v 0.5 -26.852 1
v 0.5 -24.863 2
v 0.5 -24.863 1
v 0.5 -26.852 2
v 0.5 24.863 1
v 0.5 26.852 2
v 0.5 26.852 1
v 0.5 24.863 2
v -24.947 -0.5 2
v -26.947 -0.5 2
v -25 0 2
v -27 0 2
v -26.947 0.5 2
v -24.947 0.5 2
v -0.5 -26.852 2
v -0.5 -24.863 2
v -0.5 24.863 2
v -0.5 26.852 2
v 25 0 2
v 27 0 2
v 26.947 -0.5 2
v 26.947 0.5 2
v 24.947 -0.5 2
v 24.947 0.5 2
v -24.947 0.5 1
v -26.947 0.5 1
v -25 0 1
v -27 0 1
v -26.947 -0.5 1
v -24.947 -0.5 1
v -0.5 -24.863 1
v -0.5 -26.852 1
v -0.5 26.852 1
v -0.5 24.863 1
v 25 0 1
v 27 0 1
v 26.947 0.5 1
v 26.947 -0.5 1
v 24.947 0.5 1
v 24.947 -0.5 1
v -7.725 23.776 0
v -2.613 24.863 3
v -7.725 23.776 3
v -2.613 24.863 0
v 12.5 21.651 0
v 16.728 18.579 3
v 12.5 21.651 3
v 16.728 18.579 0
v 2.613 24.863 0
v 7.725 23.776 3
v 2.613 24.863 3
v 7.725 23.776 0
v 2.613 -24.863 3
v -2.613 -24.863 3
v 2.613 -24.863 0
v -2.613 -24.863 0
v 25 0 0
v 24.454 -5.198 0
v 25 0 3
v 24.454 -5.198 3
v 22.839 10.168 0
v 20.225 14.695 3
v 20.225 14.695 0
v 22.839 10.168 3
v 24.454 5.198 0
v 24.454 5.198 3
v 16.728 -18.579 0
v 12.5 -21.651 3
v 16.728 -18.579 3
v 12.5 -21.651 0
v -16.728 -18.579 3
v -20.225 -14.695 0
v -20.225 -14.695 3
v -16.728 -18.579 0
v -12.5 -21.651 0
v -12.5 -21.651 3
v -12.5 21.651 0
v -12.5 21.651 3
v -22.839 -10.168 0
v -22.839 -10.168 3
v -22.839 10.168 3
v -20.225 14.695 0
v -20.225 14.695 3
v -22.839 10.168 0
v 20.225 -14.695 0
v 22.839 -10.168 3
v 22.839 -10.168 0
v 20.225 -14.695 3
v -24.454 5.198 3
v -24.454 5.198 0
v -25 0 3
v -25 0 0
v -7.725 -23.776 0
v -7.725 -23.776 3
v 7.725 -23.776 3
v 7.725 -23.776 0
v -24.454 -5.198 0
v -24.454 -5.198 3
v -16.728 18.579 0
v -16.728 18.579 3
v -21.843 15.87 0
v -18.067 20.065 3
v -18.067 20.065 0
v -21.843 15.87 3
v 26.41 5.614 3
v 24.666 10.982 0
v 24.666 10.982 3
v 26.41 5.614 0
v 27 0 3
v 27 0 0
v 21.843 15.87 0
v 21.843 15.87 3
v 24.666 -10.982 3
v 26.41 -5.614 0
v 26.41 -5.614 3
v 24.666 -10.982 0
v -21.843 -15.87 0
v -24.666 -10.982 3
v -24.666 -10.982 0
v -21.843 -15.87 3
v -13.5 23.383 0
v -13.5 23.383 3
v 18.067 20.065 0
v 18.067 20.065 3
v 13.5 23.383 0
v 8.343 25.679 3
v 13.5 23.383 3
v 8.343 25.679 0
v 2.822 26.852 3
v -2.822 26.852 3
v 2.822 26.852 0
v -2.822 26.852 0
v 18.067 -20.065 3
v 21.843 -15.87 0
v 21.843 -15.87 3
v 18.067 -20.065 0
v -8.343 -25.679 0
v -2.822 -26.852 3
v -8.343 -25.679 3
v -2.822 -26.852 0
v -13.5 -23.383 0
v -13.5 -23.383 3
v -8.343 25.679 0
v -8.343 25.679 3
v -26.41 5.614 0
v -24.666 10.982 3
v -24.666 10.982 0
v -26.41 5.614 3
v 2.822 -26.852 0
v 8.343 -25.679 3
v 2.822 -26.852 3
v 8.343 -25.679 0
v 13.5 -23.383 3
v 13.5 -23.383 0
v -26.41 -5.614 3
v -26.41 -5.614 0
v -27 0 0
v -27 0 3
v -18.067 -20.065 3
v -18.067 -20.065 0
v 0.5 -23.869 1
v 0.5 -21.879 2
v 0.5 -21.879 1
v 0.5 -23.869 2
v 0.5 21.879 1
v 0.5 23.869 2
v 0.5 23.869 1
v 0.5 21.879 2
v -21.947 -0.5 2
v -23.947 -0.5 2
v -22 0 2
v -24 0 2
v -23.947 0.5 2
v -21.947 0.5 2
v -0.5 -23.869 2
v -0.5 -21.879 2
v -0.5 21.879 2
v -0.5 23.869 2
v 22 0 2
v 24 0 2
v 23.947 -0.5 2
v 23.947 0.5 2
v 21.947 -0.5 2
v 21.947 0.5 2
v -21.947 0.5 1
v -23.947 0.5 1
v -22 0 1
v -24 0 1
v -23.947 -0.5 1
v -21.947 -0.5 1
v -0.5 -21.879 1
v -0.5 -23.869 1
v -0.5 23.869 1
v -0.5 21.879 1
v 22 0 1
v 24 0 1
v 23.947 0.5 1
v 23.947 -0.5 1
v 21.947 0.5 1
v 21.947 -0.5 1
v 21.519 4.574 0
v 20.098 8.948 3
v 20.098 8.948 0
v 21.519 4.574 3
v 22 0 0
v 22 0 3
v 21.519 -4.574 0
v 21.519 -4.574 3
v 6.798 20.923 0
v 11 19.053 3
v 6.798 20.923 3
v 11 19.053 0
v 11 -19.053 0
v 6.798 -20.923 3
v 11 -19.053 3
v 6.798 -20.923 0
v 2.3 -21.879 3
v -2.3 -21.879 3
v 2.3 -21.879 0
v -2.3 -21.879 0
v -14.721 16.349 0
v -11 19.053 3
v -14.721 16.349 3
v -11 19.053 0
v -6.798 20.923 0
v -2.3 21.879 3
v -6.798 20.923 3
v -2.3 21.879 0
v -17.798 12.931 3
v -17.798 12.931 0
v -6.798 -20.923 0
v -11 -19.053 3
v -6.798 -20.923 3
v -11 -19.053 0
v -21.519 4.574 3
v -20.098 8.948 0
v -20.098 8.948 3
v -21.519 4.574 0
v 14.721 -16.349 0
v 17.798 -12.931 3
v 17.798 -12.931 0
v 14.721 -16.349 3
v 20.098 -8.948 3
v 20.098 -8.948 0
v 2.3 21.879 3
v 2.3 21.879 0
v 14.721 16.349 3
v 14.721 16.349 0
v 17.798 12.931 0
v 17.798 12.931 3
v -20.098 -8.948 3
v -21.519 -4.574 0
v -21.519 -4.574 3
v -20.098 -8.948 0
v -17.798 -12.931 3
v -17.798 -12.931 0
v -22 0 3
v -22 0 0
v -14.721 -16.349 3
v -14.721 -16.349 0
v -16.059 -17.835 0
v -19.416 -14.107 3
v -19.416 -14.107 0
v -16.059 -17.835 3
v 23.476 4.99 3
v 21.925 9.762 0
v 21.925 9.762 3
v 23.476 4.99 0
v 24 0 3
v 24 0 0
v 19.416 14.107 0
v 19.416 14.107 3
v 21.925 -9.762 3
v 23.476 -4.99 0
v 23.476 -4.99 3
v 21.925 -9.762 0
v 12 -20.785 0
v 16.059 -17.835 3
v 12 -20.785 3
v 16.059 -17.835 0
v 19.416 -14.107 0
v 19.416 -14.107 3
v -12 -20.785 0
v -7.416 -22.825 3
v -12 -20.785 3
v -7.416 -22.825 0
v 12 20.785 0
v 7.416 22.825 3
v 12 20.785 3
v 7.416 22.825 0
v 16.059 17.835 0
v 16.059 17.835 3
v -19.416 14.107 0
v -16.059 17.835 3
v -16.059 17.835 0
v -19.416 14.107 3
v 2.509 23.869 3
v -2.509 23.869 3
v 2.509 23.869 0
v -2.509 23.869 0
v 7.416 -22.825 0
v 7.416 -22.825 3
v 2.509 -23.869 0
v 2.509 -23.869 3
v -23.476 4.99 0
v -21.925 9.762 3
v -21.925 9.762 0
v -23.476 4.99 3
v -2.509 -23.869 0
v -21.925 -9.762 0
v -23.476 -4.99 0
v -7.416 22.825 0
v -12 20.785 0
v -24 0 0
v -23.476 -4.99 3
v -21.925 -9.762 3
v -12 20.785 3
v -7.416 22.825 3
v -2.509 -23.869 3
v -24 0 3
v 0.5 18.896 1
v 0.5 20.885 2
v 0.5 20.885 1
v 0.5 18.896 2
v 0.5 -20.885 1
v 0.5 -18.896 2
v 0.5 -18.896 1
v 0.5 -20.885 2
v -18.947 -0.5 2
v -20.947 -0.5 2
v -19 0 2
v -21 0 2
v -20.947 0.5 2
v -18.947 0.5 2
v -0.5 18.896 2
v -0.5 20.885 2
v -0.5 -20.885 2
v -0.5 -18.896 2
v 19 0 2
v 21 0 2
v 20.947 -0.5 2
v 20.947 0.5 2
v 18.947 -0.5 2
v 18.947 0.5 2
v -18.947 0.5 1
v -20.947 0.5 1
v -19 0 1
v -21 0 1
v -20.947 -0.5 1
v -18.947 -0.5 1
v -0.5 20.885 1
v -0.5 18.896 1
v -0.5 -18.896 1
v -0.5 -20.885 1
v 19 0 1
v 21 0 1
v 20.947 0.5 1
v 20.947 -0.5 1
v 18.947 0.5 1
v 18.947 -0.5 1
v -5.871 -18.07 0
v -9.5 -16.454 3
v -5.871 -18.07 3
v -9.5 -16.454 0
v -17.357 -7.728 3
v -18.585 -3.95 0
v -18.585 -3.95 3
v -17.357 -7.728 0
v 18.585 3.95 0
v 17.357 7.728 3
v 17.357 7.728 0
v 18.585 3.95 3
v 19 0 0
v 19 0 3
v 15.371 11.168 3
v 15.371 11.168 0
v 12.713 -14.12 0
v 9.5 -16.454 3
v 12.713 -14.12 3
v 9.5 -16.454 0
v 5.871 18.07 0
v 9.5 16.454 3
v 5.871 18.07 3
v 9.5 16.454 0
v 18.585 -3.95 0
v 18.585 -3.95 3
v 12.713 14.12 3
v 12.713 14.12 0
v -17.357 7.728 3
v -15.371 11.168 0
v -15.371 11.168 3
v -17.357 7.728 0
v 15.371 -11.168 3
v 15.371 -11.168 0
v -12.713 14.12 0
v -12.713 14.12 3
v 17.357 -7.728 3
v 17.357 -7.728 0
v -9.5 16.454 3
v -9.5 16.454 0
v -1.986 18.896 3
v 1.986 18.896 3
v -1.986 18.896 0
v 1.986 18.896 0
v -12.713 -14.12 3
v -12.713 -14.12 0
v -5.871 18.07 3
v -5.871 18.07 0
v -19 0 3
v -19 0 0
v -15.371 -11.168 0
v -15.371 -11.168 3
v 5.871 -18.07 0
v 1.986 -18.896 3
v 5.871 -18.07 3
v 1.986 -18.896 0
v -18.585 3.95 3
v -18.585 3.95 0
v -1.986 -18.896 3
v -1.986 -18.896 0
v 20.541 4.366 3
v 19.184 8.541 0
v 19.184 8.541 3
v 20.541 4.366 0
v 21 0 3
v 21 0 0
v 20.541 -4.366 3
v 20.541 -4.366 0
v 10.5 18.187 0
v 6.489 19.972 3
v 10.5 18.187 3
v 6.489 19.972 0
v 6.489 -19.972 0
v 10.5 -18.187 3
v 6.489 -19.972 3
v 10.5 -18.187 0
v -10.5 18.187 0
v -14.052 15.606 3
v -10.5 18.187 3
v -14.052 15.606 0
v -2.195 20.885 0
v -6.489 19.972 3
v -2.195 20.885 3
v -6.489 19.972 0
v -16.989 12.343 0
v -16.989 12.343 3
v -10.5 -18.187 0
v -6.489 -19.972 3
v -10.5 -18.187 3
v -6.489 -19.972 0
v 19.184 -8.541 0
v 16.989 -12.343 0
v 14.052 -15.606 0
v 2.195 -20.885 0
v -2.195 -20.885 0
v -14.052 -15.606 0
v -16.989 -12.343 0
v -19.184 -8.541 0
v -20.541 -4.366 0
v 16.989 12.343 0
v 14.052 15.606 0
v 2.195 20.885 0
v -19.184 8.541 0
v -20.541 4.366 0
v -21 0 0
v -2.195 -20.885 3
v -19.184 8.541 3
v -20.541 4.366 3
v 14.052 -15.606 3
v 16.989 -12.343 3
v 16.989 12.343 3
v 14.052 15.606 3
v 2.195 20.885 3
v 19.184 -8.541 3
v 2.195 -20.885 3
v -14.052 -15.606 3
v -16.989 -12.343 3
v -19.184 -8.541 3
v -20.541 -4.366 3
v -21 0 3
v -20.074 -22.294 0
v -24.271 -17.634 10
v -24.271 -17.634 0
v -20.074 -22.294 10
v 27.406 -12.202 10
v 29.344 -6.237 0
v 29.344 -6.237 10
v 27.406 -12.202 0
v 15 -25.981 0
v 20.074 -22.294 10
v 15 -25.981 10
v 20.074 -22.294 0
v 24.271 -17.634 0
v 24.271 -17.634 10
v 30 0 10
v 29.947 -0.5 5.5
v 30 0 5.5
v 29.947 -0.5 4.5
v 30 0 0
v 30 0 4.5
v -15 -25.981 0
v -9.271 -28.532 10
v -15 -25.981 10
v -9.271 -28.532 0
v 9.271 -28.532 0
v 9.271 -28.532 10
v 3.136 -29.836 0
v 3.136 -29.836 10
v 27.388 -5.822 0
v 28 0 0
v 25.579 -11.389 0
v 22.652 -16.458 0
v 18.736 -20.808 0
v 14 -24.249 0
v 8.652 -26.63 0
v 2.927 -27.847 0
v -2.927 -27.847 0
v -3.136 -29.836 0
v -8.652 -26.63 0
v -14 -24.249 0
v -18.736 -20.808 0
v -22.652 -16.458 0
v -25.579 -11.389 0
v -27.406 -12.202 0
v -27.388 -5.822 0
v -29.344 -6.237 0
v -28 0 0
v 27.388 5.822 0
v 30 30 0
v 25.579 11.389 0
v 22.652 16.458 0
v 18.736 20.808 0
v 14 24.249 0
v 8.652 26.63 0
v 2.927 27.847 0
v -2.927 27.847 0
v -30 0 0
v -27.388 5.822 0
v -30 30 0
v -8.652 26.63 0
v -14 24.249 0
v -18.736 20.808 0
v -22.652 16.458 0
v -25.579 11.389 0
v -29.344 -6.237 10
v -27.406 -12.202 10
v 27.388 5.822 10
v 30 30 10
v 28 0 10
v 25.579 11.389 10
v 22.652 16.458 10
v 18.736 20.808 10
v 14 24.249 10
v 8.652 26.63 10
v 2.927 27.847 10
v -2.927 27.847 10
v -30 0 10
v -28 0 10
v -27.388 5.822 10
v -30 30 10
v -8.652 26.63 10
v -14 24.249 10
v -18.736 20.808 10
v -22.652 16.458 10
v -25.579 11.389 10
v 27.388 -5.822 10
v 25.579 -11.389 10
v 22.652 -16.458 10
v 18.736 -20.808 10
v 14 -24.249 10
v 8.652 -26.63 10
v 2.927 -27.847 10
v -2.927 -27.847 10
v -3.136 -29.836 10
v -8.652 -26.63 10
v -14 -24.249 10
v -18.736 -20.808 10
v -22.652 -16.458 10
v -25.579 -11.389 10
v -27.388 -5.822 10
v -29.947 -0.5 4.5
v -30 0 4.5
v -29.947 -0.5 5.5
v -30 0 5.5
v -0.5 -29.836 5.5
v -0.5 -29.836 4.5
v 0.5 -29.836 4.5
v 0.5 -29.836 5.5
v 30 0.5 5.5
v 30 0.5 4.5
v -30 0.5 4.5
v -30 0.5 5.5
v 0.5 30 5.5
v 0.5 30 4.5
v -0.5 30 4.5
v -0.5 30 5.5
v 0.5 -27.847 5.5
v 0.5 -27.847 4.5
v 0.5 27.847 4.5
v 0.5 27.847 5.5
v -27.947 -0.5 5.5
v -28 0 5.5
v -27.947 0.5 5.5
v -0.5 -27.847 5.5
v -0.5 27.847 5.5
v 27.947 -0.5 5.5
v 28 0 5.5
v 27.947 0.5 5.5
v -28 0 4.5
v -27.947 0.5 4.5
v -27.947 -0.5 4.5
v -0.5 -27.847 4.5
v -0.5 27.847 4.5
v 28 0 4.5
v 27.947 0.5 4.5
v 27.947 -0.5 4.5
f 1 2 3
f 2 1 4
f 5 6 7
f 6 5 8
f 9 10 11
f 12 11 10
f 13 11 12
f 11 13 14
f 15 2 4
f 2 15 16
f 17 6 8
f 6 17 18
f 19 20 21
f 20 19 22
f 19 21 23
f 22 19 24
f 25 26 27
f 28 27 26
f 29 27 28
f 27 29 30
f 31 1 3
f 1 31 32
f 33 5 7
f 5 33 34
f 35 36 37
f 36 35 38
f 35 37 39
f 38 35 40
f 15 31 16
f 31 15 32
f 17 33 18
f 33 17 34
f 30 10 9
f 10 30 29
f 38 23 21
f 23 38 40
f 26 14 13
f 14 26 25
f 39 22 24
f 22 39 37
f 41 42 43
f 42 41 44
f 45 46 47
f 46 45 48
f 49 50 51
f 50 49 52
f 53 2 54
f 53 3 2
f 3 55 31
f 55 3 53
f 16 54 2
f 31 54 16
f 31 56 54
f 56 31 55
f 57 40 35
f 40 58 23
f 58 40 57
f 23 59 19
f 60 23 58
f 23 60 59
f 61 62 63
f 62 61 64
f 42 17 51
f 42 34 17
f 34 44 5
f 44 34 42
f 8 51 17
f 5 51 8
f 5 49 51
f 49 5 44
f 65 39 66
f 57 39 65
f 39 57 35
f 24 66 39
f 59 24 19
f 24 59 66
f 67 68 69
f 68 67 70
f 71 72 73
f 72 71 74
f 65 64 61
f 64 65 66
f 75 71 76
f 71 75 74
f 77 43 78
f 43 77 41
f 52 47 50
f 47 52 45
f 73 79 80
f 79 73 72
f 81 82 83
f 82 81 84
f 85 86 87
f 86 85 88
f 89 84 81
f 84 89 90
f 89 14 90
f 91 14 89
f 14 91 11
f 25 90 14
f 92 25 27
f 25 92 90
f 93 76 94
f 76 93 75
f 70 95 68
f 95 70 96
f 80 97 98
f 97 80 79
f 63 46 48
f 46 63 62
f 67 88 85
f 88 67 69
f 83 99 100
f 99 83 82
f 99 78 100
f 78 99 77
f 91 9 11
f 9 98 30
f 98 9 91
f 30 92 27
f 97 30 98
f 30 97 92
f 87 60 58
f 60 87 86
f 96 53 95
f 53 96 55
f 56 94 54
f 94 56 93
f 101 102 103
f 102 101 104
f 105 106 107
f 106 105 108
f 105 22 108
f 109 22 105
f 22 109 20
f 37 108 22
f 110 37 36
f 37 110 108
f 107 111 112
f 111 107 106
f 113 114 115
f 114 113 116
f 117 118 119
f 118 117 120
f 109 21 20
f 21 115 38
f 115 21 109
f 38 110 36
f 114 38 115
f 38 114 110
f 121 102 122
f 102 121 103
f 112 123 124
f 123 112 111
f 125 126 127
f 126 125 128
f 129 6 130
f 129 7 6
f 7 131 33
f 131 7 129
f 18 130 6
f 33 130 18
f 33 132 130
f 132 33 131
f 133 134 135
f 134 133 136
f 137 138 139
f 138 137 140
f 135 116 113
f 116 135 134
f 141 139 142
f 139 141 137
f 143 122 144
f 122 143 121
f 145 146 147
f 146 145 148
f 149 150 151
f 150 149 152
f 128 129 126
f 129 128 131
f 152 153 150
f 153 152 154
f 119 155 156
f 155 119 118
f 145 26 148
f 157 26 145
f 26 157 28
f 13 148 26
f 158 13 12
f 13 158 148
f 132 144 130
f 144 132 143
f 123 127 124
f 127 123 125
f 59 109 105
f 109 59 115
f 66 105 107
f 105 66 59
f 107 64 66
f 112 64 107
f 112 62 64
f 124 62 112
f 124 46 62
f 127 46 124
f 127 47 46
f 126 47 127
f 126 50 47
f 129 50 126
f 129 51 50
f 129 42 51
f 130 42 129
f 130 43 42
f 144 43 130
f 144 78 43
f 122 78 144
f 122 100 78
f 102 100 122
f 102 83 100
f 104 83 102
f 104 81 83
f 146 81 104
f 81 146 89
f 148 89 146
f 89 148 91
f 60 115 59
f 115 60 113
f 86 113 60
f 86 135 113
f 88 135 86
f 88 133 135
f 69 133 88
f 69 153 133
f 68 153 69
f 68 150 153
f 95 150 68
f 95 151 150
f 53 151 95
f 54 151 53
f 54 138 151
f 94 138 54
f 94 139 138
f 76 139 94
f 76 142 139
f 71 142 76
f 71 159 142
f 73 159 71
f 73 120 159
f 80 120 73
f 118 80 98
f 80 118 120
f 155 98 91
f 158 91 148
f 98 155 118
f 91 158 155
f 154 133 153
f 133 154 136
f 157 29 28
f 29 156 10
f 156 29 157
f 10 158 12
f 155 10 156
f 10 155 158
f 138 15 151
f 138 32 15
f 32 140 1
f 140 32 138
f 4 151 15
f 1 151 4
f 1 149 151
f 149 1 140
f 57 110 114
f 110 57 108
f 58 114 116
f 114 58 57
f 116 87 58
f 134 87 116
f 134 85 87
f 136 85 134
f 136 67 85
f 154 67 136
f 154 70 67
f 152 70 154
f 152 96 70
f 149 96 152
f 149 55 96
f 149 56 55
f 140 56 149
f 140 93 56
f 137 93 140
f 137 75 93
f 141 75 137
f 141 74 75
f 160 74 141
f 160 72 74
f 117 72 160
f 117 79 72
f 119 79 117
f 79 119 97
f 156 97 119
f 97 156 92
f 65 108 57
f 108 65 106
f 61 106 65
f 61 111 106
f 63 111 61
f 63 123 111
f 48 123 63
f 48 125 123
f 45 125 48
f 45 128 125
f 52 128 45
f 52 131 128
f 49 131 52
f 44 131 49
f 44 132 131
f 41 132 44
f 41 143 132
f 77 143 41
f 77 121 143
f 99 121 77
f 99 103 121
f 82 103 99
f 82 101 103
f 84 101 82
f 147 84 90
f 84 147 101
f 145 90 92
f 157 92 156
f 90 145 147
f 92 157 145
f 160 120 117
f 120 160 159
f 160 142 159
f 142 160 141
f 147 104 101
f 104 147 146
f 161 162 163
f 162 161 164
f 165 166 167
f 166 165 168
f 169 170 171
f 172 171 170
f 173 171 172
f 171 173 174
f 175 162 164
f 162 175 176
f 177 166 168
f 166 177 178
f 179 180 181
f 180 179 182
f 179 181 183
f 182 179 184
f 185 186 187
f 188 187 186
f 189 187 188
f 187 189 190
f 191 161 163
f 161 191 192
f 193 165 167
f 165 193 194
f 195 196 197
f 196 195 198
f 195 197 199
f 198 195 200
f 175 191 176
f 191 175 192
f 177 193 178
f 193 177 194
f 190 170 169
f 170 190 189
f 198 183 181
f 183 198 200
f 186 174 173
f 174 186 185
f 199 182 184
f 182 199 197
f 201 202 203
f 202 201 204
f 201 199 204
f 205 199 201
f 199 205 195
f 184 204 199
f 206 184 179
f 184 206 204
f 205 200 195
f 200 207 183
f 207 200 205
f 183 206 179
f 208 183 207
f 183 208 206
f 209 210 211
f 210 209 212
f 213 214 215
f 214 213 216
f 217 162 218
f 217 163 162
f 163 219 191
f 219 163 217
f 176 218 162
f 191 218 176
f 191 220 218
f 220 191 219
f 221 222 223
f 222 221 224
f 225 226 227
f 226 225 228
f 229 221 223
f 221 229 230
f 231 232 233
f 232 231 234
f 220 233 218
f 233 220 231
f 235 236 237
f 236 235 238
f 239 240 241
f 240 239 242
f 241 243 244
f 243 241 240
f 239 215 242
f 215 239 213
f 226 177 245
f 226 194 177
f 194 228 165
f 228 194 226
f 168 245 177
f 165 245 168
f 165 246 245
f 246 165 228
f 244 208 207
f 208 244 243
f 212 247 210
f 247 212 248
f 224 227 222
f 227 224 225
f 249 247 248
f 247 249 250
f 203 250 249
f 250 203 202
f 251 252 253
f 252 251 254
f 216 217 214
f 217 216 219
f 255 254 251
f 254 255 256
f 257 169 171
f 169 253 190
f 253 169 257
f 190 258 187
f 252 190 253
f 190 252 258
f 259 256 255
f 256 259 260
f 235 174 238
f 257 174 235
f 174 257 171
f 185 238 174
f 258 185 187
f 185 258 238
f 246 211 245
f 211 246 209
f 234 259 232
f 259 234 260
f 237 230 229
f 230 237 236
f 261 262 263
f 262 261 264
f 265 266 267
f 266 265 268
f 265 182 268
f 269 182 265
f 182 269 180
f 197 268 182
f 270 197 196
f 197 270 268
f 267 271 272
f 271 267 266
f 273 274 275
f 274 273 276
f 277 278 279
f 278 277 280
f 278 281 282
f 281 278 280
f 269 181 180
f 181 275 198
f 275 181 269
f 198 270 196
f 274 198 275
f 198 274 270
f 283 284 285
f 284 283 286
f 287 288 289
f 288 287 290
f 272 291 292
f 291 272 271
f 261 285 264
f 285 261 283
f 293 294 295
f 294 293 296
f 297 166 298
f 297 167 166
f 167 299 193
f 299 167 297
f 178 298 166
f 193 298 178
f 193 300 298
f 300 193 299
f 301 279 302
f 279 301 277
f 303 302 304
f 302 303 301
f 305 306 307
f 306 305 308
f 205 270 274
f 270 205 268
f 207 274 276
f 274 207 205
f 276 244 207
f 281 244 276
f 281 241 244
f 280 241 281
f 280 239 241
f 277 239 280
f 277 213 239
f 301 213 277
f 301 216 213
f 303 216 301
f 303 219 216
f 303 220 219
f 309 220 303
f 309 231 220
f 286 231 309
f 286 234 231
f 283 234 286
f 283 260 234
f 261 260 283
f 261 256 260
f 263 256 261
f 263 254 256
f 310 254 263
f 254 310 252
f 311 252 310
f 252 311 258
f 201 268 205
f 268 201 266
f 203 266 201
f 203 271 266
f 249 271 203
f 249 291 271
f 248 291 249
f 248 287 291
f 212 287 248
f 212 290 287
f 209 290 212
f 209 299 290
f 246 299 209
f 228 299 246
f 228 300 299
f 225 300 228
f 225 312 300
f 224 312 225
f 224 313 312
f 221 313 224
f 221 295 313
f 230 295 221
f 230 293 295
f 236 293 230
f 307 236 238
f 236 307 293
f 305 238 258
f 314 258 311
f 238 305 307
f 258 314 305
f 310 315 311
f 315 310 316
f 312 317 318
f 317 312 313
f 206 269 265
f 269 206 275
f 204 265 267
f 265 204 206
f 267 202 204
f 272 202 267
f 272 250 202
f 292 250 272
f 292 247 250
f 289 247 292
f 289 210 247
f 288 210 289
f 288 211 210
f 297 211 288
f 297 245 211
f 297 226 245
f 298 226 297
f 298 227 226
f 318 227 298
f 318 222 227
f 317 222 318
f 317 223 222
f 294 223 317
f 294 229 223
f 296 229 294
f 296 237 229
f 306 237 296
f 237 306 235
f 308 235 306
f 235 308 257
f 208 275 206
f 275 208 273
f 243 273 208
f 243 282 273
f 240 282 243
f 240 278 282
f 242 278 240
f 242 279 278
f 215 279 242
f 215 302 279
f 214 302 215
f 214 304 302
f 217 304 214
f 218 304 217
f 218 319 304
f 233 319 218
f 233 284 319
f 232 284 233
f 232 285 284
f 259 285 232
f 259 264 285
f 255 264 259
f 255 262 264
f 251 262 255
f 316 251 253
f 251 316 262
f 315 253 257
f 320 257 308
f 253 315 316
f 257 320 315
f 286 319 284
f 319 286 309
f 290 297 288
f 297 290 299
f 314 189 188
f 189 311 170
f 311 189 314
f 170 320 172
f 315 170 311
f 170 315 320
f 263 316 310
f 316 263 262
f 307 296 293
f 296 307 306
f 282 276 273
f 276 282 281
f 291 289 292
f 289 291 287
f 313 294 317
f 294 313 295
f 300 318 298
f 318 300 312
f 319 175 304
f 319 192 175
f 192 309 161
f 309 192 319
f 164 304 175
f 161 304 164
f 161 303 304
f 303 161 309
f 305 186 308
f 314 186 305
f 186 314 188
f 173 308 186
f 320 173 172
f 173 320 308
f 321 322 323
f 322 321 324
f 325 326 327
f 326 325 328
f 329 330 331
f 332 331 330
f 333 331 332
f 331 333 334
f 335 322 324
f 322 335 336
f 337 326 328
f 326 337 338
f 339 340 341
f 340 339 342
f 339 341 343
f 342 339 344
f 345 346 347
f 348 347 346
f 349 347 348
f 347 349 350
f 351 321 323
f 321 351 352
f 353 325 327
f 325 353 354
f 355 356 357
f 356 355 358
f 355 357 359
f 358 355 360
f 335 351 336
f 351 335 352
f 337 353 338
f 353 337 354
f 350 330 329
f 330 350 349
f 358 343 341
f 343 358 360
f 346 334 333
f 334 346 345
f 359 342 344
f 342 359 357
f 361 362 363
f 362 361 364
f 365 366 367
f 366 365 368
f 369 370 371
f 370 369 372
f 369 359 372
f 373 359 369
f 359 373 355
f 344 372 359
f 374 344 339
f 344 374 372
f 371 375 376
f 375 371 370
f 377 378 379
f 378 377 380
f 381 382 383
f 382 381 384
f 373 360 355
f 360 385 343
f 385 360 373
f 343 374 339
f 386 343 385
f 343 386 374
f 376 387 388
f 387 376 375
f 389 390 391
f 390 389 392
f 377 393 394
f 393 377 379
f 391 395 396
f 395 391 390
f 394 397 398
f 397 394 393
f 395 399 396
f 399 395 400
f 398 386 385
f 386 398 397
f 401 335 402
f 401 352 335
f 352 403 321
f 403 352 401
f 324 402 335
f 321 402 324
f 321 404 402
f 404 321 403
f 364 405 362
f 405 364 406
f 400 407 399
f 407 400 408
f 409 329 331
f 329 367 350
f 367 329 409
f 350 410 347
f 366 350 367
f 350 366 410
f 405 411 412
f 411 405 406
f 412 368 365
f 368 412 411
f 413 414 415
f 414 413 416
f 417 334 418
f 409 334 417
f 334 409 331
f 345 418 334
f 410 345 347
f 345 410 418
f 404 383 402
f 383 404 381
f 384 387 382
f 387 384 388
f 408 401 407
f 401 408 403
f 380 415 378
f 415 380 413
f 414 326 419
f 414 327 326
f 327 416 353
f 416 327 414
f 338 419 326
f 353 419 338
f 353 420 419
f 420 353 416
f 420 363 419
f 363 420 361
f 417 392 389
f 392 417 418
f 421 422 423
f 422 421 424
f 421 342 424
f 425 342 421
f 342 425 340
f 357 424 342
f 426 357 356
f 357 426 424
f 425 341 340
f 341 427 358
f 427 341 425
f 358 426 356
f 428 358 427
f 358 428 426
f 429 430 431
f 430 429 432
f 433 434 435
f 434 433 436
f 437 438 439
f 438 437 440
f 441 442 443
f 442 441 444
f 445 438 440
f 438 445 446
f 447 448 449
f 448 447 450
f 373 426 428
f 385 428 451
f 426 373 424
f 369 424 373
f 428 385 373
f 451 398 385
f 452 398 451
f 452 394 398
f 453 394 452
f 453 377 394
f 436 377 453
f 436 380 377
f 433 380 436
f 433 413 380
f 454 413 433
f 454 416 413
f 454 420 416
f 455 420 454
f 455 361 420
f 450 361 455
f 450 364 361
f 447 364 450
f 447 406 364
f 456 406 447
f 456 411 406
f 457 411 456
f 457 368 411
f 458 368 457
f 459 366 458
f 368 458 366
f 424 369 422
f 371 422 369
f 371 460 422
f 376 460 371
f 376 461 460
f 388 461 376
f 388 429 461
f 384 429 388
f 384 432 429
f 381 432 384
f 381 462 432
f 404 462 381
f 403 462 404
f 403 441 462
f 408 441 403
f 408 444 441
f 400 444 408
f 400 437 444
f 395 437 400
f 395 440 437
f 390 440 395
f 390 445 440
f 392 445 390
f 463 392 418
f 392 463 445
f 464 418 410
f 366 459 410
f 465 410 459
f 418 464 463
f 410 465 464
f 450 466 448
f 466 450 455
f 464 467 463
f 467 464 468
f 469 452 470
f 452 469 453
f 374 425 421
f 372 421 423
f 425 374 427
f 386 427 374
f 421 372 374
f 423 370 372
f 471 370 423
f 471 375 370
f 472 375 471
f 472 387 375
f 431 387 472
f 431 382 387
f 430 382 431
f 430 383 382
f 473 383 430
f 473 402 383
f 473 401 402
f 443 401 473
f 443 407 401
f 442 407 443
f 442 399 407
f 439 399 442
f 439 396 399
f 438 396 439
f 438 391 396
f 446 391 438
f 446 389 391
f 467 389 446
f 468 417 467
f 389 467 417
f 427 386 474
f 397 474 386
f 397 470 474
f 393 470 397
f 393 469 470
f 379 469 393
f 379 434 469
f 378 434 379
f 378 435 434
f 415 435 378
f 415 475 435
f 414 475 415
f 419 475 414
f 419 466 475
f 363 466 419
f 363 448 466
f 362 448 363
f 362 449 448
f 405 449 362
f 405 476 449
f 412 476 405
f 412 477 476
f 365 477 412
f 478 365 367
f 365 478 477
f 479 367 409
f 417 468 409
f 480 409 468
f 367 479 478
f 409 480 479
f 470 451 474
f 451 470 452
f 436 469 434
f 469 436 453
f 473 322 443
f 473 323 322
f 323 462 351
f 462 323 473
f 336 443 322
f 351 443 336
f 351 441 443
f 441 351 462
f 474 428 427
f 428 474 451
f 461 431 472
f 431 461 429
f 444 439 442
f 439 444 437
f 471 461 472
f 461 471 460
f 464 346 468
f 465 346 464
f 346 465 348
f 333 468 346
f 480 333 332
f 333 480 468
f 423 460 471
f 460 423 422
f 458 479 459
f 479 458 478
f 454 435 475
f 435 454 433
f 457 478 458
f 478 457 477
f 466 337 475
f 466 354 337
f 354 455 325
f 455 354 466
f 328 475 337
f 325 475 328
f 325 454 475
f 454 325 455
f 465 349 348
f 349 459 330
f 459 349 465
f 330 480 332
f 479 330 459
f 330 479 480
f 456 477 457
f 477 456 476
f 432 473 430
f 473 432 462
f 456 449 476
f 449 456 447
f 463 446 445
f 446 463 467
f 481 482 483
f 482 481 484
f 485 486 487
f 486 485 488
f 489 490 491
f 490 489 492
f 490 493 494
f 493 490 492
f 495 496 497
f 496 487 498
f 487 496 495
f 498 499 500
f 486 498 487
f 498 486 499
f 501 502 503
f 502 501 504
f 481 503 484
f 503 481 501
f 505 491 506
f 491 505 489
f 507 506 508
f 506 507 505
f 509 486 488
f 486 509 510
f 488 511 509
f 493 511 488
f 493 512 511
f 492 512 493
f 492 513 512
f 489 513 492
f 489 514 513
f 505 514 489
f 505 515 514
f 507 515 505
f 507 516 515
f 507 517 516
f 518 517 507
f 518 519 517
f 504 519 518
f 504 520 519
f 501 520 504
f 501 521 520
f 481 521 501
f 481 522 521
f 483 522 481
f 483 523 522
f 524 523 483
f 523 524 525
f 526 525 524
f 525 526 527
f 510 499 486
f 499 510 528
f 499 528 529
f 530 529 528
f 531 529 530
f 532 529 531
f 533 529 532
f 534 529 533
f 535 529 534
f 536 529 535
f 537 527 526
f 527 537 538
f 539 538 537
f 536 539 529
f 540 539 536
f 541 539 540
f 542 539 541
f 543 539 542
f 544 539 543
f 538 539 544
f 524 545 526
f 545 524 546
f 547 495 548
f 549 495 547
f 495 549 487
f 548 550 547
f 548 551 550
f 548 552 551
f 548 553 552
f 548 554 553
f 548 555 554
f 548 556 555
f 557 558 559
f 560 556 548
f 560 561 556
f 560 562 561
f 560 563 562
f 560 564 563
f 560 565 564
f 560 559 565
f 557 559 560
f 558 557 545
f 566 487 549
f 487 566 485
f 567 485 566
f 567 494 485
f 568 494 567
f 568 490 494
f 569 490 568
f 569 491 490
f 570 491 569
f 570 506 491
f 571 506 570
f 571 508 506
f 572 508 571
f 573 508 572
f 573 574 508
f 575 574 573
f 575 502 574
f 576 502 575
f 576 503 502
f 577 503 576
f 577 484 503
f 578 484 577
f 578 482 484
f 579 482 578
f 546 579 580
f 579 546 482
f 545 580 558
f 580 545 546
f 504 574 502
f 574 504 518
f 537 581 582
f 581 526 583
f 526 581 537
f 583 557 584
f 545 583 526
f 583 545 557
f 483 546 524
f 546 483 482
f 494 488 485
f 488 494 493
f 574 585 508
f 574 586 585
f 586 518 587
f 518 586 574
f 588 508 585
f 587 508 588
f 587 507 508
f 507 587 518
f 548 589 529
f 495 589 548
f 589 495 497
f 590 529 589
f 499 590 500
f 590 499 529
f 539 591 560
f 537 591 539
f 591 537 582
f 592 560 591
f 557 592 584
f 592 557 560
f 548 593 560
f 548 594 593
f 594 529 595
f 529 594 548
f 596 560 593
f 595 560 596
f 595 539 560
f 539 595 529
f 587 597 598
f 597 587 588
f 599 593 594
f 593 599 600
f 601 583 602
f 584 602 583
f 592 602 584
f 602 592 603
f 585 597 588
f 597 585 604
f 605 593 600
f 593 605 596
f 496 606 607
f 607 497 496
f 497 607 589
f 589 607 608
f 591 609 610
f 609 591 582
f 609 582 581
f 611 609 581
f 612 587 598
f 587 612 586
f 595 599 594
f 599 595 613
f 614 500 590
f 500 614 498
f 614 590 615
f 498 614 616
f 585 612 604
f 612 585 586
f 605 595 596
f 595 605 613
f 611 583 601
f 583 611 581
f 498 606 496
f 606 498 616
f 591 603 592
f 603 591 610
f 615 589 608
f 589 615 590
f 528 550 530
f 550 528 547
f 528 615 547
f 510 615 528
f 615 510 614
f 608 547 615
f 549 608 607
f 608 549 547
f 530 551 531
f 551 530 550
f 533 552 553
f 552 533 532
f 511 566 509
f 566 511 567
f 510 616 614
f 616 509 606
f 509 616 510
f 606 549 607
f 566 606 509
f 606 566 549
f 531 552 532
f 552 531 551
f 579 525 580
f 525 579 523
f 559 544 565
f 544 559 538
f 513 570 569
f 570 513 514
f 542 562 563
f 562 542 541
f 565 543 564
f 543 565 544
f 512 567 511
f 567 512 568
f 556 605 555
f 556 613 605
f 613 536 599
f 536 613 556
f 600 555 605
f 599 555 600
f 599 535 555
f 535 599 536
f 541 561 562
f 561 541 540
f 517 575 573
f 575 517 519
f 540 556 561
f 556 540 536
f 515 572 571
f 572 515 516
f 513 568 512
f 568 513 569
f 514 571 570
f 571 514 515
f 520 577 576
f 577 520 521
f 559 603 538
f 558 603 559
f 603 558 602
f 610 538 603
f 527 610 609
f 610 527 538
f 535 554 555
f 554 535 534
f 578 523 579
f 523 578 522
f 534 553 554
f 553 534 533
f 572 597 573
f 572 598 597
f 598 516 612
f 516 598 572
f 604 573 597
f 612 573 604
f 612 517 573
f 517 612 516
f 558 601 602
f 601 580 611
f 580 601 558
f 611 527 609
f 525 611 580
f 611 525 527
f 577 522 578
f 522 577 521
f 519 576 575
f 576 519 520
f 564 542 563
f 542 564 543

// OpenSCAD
//I was working on a gyroscope or something.
module gyroring(
	r=50,
	rimsize=2,
	holesize=1,
	thickness=3,
	support=0
){
	translate([0,0,thickness/2])
	difference(){
		union(){
			cylinder(r=r,h=thickness,center=true);
			if(support)
				translate([-r,0,-thickness/2]) cube([r*2,r,thickness]);
		}
		union(){
			cylinder(r=r-rimsize,h=thickness*3,center=true);
			for(i=[0:1]) rotate([0,0,90*i])
			cube([holesize,r*3,holesize],center=true);
		}
	}
}
maxr=30;
rimsize=2;
for(i=[1:3]) gyroring(r=maxr-((rimsize+1)*i));
gyroring(r=maxr,thickness=10,support=true);
